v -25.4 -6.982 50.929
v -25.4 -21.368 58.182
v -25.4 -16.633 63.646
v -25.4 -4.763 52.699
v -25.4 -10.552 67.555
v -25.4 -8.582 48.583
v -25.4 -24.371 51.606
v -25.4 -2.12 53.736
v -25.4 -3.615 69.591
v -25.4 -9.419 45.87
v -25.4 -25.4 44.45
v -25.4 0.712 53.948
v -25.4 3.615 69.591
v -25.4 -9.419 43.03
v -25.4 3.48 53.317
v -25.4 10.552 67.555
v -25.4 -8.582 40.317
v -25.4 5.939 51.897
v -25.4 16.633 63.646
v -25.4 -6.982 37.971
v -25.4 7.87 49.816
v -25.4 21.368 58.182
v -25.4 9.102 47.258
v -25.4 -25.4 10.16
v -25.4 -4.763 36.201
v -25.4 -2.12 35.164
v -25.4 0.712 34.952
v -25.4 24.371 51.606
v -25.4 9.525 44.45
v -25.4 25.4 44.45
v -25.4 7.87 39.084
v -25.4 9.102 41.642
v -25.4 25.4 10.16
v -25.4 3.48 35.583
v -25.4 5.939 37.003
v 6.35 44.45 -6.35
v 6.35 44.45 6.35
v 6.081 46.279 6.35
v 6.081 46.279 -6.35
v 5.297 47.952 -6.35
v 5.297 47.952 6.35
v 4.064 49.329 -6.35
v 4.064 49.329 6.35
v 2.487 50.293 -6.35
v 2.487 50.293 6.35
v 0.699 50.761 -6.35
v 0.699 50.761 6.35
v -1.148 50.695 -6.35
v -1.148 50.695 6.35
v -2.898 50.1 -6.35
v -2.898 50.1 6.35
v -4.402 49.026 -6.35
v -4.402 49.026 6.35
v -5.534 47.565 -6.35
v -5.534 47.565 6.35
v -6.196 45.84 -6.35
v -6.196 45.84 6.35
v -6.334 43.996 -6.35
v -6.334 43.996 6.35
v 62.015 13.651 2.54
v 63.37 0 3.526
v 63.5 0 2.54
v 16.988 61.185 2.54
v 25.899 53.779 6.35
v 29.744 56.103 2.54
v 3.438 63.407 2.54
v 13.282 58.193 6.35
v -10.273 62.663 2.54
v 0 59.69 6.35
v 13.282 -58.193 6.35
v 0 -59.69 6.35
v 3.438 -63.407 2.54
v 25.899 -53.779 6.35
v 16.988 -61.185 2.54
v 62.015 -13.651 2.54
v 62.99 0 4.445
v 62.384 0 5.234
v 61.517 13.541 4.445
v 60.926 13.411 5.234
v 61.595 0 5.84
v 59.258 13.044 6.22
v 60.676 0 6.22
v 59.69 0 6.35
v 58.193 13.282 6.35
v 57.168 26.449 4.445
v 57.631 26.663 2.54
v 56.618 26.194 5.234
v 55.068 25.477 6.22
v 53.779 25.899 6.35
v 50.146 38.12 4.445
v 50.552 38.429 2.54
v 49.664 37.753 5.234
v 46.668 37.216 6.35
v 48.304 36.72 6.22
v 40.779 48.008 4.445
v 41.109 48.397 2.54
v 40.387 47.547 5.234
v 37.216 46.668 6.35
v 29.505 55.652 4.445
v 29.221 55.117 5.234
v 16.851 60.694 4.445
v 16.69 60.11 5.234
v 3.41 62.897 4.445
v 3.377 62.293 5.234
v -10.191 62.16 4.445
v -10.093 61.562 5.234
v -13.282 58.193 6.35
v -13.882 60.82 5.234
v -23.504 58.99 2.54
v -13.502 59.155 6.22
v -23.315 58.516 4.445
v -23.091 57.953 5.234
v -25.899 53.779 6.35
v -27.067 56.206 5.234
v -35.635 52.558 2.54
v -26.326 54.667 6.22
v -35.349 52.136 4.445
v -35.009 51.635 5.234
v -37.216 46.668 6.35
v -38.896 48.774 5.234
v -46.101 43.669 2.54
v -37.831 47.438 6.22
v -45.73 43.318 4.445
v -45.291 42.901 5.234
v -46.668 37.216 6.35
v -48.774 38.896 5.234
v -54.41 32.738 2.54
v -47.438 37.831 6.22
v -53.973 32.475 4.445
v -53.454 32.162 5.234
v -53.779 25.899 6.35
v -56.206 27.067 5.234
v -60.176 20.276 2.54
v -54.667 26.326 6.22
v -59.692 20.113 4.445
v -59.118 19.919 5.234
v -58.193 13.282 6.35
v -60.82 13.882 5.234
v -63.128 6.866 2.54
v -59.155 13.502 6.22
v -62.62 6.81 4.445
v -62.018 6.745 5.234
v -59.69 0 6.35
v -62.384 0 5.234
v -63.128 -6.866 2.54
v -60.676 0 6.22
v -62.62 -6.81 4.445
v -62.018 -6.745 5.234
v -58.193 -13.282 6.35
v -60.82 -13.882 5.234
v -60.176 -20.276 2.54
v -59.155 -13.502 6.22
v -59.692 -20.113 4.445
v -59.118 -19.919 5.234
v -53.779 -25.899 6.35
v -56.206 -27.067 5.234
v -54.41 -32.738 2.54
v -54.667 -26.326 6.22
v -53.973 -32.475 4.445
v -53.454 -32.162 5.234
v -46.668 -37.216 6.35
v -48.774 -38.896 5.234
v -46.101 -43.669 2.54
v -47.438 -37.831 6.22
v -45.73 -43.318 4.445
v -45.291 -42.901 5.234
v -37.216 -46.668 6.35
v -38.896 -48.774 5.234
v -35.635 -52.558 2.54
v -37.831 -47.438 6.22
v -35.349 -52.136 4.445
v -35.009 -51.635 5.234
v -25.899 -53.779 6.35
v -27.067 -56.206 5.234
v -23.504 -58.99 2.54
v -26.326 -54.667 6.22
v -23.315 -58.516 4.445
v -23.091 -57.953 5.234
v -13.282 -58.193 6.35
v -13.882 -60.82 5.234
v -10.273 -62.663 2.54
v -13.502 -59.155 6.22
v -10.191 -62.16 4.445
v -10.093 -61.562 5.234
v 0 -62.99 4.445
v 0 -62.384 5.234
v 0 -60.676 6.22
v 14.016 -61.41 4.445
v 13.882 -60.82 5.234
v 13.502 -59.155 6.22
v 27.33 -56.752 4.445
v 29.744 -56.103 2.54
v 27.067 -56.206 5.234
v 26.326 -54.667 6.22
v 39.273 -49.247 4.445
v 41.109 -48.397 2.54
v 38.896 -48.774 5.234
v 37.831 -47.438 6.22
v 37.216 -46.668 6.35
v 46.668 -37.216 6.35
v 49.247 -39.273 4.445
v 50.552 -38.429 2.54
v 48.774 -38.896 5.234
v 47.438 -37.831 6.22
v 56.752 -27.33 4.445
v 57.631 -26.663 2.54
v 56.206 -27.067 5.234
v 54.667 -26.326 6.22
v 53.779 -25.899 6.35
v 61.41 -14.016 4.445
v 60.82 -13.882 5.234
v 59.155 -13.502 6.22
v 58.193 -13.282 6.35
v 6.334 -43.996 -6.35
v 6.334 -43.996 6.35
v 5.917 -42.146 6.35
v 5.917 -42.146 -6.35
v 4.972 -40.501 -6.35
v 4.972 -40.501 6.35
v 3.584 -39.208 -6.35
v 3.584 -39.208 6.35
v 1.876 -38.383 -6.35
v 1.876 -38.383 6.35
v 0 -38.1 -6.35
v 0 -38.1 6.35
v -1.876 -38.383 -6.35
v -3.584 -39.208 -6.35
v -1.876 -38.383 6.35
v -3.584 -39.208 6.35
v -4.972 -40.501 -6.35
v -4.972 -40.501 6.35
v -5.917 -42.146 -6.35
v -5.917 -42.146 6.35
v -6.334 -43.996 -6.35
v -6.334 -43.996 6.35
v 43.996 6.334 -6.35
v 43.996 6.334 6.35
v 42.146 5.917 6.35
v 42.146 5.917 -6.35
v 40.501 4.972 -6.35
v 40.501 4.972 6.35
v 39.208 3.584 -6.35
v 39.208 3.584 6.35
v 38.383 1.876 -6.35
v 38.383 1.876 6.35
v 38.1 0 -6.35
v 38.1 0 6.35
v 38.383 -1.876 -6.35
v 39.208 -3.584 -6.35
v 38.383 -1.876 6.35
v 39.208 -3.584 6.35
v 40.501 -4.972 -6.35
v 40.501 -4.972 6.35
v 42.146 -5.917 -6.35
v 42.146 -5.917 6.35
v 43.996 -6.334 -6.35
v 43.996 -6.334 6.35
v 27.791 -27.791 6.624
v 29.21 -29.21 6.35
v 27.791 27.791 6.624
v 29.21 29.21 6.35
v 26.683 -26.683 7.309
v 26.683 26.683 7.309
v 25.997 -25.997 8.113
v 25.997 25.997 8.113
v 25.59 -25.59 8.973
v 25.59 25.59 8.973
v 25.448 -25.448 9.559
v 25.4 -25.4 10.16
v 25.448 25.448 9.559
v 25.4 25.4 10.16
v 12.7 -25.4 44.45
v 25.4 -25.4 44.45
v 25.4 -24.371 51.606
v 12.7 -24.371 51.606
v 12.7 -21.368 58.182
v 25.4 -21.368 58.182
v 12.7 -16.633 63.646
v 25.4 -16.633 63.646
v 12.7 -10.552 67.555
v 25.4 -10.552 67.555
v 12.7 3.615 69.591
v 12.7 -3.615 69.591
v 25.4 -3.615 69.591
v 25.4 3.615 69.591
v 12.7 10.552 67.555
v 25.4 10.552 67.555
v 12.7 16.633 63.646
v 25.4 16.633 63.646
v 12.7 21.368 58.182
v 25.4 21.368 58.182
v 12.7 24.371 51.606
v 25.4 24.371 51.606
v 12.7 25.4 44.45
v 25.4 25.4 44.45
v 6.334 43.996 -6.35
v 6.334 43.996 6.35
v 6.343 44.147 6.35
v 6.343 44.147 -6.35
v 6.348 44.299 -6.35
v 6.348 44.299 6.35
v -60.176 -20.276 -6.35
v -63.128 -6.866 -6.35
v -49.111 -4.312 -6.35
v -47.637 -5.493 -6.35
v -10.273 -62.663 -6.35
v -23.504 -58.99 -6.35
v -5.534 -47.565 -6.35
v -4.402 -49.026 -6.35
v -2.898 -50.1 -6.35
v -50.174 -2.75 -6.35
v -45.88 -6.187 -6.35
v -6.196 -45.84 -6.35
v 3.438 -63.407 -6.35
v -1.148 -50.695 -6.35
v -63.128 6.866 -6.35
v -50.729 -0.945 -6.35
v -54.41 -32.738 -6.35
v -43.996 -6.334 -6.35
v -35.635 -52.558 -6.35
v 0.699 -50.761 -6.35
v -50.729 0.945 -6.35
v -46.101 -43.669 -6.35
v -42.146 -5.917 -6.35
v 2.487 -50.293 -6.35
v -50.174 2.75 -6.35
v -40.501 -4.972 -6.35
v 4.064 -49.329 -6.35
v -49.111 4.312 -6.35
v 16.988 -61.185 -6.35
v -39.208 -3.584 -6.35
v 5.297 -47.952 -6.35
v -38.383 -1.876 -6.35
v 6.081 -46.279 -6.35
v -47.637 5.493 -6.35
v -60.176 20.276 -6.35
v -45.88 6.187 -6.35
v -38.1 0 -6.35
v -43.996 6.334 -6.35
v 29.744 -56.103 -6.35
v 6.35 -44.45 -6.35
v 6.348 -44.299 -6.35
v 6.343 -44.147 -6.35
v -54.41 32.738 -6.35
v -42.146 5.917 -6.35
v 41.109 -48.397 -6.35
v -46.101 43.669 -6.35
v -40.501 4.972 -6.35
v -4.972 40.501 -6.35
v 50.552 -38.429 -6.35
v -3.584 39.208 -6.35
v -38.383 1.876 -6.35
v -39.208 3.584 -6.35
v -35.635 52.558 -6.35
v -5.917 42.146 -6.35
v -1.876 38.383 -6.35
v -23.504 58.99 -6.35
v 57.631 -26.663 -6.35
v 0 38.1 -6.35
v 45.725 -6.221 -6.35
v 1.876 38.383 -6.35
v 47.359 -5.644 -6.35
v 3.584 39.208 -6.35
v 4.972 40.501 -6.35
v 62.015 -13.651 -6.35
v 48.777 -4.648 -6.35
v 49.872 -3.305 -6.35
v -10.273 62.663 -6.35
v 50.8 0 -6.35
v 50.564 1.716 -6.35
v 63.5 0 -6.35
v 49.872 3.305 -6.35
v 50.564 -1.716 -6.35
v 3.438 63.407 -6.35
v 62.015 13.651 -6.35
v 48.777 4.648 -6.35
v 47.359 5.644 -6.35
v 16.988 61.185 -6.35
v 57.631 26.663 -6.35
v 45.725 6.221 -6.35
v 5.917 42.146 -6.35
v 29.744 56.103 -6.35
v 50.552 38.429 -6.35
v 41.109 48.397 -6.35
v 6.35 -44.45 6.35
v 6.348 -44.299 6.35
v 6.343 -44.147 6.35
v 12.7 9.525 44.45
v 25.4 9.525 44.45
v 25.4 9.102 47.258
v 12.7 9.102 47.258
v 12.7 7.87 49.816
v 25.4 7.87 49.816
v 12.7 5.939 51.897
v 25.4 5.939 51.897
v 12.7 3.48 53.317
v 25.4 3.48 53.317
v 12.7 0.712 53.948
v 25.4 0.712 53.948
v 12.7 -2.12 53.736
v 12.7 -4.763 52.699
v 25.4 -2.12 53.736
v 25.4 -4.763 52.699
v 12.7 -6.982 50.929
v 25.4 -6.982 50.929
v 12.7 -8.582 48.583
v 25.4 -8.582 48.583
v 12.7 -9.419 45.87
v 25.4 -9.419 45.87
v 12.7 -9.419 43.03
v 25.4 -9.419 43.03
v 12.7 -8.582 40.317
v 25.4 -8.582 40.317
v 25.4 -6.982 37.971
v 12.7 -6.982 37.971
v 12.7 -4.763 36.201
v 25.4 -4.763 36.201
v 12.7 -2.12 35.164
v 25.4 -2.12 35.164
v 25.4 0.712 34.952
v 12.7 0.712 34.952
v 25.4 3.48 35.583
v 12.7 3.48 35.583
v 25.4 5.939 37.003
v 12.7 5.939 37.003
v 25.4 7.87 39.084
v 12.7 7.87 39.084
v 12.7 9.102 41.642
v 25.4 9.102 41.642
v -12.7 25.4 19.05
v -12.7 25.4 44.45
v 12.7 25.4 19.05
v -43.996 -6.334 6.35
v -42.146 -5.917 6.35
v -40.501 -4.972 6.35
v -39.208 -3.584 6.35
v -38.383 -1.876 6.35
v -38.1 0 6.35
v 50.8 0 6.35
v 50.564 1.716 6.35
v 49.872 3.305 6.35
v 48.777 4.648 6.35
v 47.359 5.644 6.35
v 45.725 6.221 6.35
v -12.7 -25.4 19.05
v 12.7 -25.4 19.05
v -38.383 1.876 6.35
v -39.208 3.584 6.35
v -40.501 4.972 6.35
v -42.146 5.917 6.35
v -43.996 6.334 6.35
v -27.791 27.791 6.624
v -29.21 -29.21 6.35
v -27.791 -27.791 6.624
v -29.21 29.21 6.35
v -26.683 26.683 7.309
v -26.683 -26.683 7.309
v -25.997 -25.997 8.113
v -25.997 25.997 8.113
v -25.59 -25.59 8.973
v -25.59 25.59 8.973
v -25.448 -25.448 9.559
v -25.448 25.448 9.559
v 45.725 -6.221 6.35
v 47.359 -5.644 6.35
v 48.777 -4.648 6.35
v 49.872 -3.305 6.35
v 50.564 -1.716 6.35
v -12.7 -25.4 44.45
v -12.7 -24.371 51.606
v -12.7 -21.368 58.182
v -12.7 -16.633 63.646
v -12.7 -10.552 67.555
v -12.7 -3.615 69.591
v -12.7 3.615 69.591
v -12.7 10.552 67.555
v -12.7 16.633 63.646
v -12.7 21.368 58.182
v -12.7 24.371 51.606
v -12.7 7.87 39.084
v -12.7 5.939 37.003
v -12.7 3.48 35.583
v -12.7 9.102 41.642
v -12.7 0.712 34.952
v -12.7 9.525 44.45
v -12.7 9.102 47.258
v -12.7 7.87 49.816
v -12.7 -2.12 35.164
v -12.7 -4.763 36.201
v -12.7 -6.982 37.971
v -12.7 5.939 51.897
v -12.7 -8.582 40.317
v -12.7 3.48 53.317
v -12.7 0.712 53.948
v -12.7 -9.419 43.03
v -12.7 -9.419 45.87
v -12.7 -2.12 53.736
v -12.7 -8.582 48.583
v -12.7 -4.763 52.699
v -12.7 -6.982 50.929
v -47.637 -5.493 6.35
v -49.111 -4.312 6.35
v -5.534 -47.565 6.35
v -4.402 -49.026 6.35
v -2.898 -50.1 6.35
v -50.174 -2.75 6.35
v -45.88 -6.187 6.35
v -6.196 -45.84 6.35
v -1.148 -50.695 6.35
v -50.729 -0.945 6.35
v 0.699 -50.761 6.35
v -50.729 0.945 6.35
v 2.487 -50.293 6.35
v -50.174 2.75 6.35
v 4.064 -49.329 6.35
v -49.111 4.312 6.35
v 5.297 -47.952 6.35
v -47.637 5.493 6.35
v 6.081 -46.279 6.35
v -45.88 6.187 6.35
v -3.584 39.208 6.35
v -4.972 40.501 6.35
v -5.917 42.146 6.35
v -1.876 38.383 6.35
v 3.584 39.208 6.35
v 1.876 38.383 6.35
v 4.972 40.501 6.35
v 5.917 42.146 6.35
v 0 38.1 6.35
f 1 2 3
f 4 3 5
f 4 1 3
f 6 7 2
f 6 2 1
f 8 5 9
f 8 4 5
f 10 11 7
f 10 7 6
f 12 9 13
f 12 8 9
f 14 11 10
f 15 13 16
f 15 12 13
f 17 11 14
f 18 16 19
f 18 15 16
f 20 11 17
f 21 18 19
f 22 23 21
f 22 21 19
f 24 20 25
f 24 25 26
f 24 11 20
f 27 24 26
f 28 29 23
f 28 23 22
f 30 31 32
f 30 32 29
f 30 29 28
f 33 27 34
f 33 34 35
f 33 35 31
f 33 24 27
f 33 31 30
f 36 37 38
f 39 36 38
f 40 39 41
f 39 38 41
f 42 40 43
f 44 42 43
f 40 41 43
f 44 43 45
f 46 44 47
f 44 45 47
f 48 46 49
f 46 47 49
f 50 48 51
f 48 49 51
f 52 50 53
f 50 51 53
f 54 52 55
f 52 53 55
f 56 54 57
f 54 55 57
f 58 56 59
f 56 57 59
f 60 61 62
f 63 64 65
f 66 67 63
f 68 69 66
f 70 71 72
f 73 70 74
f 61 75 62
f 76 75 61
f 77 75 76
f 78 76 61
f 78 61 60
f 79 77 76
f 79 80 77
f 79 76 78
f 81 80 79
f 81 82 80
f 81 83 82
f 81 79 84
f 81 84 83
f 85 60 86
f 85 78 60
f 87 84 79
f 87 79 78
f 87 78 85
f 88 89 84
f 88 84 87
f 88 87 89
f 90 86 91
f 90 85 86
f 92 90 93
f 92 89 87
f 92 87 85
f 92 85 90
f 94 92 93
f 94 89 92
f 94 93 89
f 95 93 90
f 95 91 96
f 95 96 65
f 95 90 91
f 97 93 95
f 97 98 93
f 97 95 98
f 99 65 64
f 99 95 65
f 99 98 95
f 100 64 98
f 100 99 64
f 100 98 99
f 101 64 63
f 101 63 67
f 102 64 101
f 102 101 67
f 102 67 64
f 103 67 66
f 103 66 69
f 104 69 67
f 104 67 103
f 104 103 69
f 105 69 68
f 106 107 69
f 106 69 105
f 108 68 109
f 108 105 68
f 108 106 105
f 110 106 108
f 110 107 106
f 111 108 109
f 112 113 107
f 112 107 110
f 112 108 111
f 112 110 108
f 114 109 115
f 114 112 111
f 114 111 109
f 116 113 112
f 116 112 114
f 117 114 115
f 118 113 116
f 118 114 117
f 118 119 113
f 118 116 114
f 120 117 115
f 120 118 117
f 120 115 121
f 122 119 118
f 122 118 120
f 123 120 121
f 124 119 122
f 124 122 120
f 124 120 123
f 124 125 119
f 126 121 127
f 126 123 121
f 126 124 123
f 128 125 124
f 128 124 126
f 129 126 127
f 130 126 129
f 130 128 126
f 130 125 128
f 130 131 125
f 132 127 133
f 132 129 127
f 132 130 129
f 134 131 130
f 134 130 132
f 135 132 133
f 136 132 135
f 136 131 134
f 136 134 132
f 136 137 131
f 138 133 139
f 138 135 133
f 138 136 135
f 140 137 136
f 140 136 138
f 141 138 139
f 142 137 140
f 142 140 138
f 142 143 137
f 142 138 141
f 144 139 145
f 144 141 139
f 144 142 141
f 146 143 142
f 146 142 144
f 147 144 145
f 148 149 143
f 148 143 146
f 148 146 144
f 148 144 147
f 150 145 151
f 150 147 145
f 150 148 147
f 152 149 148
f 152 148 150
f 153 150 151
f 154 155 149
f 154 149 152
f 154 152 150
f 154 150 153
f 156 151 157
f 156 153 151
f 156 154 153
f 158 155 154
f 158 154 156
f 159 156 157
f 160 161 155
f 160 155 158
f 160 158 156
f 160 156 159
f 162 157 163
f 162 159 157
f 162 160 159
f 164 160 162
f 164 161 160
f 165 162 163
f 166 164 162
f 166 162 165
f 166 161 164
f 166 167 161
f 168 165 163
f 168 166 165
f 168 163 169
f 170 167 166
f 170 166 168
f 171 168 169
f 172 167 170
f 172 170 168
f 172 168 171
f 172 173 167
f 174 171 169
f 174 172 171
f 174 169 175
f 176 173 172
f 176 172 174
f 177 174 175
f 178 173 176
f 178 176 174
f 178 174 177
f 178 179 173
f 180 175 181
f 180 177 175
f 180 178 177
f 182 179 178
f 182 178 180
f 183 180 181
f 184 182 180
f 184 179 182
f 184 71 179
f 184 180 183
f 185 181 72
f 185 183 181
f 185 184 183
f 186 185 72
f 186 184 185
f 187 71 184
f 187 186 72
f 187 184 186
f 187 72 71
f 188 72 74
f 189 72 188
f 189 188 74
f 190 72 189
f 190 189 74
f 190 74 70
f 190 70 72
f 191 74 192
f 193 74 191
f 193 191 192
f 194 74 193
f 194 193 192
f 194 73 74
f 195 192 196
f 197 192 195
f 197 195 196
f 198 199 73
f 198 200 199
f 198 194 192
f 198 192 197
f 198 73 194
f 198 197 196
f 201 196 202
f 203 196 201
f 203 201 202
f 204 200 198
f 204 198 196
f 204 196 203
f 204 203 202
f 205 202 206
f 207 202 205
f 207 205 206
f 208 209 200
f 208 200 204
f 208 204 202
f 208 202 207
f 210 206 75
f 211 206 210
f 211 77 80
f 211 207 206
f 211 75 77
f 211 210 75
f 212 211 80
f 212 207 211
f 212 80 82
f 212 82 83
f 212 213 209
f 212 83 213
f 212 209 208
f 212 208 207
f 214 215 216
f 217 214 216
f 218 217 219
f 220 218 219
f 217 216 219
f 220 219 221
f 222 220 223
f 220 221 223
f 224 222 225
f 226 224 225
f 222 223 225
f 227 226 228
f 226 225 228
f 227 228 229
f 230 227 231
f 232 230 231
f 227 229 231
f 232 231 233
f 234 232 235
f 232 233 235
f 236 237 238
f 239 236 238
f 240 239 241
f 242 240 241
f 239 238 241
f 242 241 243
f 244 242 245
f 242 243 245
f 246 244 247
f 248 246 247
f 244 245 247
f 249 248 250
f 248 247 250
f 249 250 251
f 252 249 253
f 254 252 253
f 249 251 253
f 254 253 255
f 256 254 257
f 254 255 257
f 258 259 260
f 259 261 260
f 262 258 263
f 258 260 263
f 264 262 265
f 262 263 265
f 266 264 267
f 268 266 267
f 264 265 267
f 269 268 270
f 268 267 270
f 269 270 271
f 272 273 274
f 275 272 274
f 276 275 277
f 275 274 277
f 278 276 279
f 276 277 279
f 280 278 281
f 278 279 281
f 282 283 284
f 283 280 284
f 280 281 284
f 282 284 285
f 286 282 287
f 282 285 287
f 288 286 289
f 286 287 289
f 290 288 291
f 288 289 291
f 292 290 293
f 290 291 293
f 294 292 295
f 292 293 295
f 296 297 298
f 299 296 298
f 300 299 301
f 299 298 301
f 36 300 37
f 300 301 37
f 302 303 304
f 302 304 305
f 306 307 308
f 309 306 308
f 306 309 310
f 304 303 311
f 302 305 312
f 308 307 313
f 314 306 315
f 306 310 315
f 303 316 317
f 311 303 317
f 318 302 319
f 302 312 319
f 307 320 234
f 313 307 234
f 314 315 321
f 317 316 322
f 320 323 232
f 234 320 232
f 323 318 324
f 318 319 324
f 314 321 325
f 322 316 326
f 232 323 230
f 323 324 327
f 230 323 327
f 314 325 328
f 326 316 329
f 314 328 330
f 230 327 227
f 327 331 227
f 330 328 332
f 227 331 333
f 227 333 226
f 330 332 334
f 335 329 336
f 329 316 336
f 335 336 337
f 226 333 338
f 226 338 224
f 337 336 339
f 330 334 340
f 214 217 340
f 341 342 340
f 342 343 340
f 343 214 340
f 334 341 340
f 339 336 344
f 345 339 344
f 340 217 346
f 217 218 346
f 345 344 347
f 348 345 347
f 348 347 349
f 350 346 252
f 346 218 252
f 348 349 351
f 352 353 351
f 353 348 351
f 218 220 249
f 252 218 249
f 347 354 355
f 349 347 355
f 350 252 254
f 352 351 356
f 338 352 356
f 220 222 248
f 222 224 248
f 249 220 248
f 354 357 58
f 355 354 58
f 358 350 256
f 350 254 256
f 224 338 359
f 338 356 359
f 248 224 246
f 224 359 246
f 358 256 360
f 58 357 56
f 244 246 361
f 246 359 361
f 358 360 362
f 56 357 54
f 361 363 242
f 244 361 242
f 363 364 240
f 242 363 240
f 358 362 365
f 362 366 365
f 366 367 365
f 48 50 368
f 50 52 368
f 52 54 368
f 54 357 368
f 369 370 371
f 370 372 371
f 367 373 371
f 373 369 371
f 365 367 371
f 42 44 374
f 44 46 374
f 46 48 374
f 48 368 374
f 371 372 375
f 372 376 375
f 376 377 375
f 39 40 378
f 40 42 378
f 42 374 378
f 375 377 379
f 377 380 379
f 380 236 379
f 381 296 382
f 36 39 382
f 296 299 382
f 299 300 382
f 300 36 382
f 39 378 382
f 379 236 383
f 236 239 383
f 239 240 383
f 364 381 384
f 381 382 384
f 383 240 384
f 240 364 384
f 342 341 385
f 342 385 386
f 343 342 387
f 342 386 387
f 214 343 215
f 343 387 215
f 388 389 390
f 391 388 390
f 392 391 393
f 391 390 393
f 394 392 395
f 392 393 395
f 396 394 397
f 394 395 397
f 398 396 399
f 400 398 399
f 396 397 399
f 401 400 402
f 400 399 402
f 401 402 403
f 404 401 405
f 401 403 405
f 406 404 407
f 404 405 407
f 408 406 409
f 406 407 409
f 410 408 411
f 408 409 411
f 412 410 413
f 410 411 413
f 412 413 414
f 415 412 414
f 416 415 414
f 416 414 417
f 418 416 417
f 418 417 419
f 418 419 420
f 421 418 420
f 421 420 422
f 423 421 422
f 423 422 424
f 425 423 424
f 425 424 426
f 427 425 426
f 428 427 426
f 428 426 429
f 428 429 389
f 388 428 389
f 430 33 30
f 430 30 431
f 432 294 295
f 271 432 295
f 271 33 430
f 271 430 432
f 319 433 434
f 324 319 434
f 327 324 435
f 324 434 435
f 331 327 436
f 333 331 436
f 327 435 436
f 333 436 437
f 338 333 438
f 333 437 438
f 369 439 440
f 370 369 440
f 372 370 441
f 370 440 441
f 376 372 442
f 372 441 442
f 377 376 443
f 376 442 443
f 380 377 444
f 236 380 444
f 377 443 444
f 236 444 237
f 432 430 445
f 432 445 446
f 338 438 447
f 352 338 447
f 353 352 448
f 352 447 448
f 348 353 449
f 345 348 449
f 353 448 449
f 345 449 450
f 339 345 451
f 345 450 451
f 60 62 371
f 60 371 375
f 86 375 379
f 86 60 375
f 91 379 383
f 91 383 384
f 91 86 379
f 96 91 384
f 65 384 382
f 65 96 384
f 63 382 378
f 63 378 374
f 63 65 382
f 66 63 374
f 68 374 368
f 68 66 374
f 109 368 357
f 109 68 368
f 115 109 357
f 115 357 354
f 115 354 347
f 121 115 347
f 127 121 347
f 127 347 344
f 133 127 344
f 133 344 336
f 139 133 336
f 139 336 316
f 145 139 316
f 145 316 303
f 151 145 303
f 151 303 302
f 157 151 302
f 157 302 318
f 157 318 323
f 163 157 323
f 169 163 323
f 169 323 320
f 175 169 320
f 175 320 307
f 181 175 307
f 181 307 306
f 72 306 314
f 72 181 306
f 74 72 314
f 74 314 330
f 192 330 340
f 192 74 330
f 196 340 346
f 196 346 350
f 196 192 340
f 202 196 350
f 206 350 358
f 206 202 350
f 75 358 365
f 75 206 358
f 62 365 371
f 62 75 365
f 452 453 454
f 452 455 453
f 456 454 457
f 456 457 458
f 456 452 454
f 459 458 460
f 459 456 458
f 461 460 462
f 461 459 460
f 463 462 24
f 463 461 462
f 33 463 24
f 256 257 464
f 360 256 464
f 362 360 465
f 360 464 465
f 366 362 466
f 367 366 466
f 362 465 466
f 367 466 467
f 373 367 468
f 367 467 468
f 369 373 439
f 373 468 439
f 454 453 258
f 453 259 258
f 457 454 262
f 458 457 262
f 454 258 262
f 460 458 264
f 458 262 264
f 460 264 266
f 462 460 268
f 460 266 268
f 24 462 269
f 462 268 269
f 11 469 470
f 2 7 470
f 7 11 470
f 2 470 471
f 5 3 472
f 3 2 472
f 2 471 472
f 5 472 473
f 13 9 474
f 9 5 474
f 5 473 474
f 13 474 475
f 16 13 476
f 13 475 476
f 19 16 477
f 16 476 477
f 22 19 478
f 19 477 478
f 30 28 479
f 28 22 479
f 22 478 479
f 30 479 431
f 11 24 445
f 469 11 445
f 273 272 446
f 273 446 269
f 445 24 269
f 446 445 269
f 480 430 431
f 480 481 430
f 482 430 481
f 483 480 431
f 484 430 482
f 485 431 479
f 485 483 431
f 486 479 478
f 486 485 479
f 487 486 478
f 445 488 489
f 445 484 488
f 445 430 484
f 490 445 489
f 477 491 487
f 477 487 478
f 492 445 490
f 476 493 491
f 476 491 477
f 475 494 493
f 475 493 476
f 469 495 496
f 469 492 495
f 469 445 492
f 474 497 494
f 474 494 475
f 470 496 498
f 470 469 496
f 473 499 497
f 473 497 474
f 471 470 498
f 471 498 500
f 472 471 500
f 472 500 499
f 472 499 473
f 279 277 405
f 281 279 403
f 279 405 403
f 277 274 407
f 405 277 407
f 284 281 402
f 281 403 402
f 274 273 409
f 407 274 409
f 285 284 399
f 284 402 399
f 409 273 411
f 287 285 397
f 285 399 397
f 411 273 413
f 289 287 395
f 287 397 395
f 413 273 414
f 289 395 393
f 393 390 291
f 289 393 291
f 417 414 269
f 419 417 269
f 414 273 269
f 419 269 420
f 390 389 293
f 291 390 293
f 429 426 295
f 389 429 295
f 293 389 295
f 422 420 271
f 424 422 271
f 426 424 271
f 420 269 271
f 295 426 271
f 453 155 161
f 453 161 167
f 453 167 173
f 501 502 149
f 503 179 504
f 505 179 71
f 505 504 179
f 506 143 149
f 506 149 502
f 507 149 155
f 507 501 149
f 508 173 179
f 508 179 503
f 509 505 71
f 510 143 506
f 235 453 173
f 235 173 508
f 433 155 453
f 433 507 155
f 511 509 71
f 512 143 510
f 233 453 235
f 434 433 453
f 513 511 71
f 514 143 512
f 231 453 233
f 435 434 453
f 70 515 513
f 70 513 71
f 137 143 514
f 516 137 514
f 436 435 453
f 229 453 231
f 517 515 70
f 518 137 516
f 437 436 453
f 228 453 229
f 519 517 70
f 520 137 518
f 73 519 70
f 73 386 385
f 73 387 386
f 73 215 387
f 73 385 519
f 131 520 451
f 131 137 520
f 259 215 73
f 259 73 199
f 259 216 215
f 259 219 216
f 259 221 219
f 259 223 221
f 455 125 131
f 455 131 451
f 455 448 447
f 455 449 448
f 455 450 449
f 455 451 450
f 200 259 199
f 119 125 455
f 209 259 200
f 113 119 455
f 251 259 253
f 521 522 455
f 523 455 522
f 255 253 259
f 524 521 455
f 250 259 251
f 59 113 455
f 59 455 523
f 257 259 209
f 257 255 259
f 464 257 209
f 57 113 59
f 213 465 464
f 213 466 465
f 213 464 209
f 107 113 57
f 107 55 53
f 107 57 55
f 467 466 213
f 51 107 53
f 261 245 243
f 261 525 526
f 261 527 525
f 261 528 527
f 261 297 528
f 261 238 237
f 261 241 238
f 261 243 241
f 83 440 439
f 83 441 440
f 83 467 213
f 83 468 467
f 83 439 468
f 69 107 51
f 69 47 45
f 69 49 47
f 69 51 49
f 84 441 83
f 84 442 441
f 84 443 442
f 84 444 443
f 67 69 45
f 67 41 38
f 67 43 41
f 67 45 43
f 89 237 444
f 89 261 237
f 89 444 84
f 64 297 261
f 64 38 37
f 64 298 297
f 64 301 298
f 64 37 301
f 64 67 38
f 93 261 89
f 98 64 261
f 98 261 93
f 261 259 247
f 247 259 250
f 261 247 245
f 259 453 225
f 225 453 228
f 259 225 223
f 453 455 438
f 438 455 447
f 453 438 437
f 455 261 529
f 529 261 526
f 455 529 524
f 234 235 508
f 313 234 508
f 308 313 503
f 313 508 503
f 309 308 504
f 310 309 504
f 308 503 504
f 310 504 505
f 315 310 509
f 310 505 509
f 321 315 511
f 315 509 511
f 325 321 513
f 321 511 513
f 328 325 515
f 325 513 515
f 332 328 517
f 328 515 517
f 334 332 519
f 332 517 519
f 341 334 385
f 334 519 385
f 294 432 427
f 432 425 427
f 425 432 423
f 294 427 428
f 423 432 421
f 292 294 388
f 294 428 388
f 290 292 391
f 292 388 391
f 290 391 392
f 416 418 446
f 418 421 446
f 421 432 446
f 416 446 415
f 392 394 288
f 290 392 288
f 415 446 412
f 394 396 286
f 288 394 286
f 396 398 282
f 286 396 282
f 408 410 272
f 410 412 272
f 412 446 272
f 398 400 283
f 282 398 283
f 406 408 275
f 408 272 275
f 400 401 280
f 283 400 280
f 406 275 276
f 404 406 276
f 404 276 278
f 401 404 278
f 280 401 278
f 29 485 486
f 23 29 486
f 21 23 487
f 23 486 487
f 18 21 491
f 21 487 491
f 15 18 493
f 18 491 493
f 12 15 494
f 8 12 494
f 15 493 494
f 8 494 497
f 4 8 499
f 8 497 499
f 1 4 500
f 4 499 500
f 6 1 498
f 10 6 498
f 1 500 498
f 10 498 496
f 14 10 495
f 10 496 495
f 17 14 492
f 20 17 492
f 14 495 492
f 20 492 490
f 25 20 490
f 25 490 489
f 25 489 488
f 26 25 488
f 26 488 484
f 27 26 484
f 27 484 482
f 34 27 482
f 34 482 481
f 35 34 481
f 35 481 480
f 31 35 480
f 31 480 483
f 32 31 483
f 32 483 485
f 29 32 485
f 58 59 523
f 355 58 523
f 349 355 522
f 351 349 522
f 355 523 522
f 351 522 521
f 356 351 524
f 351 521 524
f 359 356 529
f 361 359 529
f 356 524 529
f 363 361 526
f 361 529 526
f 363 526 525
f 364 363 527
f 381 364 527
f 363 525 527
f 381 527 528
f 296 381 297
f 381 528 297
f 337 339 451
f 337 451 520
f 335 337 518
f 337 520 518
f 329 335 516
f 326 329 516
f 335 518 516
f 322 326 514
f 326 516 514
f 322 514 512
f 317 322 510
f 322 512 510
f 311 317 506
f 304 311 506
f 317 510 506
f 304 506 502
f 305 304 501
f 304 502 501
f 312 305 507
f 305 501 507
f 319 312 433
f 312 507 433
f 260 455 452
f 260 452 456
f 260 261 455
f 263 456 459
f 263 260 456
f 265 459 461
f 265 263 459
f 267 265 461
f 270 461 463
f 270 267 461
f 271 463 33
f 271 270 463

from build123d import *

# Parameters (mm, degrees)
F0_R      = 63.5
F1_DEPTH  = 6.35
F2_W      = 50.8
F2_H      = 50.8
F3_DEPTH  = 76.2
F4_W      = 25.4
F4_H      = 63.5
F5_DEPTH  = 88.901
F6_R      = 9.525
F8_DEPTH  = 88.901
F9_DEPTH  = 88.901
F11_DEPTH = 12.701
F12_R     = 3.81


with BuildPart() as f1:
    # F0 (on Top) → F1 (new body, symmetric)
    with BuildSketch(Plane.XY):
        Circle(F0_R)
    extrude(amount=F1_DEPTH, both=True)

    # F2 (on face) → F3 (join)
    with BuildSketch(Plane.XY.offset(6.35)):
        Rectangle(F2_W, F2_H)
    extrude(amount=F3_DEPTH)

    # F4 (on face) → F5 (cut, through all)
    with BuildSketch(Plane.XZ.offset(25.4)):
        with Locations((0, 50.8)):
            Rectangle(F4_W, F4_H)
    extrude(amount=-F5_DEPTH, mode=Mode.SUBTRACT)

    # F6 (on face) → F8 (cut, through all)
    with BuildSketch(Plane.YZ.offset(25.4)):
        with Locations((0, 44.45)):
            Circle(F6_R)
    extrude(amount=-F8_DEPTH, mode=Mode.SUBTRACT)

    # F7 (on face) → F9 (cut, through all)
    with BuildSketch(Plane.YZ.offset(25.4)):
        with BuildLine():
            ThreePointArc((-25.4, 44.45), (0, 69.85), (25.4, 44.45))
            Line((25.4, 44.45), (25.4, 82.55))
            Line((25.4, 82.55), (-25.4, 82.55))
            Line((-25.4, 82.55), (-25.4, 44.45))
        make_face()
    extrude(amount=-F9_DEPTH, mode=Mode.SUBTRACT)

    # F10 (on face) → F11 (cut, through all)
    with BuildSketch(Plane.XY.offset(6.35)):
        with BuildLine():
            ThreePointArc((-43.9964285714, -6.3337803056), (-44.45, 0), (-43.9964285714, 6.3337803056))
            ThreePointArc((-43.9964285714, 6.3337803056), (-50.8, 0), (-43.9964285714, -6.3337803056))
        make_face()
        with BuildLine():
            ThreePointArc((-38.1, 0), (-39.8022759026, 4.3267956636), (-43.9964285714, 6.3337803056))
            ThreePointArc((-43.9964285714, 6.3337803056), (-44.45, 0), (-43.9964285714, -6.3337803056))
            ThreePointArc((-43.9964285714, -6.3337803056), (-39.8022759026, -4.3267956636), (-38.1, 0))
        make_face()
        with BuildLine():
            ThreePointArc((-6.3337803056, 43.9964285714), (0, 38.1), (6.3337803056, 43.9964285714))
            ThreePointArc((6.3337803056, 43.9964285714), (0, 44.45), (-6.3337803056, 43.9964285714))
        make_face()
        with BuildLine():
            ThreePointArc((-6.3337803056, 43.9964285714), (0, 44.45), (6.3337803056, 43.9964285714))
            ThreePointArc((6.3337803056, 43.9964285714), (6.3459437809, 44.2230693282), (6.35, 44.45))
            ThreePointArc((6.35, 44.45), (-0.2269306718, 50.7959437809), (-6.3337803056, 43.9964285714))
        make_face()
        with BuildLine():
            ThreePointArc((43.9964285714, -6.3337803056), (44.336462139, -3.175), (44.45, 0))
            ThreePointArc((44.45, 0), (44.336462139, 3.175), (43.9964285714, 6.3337803056))
            ThreePointArc((43.9964285714, 6.3337803056), (38.1, 0), (43.9964285714, -6.3337803056))
        make_face()
        with BuildLine():
            ThreePointArc((43.9964285714, 6.3337803056), (44.336462139, 3.175), (44.45, 0))
            ThreePointArc((44.45, 0), (44.336462139, -3.175), (43.9964285714, -6.3337803056))
            ThreePointArc((43.9964285714, -6.3337803056), (48.7767956636, -4.6477240974), (50.8, 0))
            ThreePointArc((50.8, 0), (48.7767956636, 4.6477240974), (43.9964285714, 6.3337803056))
        make_face()
        with BuildLine():
            ThreePointArc((-6.3337803056, -43.9964285714), (0, -44.45), (6.3337803056, -43.9964285714))
            ThreePointArc((6.3337803056, -43.9964285714), (0, -38.1), (-6.3337803056, -43.9964285714))
        make_face()
        with BuildLine():
            ThreePointArc((6.35, -44.45), (6.3459437809, -44.2230693282), (6.3337803056, -43.9964285714))
            ThreePointArc((6.3337803056, -43.9964285714), (0, -44.45), (-6.3337803056, -43.9964285714))
            ThreePointArc((-6.3337803056, -43.9964285714), (-0.2269306718, -50.7959437809), (6.35, -44.45))
        make_face()
    extrude(amount=-F11_DEPTH, mode=Mode.SUBTRACT)

    # F12
    f12_edges = [f1.edges().sort_by_distance(p)[0] for p in [
        (-63.5, 0, 6.35),
        (25.4, 0, 6.35),
        (0, -25.4, 6.35),
        (-25.4, 0, 6.35),
        (0, 25.4, 6.35),
    ]]
    fillet(f12_edges, radius=F12_R)


solid = f1.part
